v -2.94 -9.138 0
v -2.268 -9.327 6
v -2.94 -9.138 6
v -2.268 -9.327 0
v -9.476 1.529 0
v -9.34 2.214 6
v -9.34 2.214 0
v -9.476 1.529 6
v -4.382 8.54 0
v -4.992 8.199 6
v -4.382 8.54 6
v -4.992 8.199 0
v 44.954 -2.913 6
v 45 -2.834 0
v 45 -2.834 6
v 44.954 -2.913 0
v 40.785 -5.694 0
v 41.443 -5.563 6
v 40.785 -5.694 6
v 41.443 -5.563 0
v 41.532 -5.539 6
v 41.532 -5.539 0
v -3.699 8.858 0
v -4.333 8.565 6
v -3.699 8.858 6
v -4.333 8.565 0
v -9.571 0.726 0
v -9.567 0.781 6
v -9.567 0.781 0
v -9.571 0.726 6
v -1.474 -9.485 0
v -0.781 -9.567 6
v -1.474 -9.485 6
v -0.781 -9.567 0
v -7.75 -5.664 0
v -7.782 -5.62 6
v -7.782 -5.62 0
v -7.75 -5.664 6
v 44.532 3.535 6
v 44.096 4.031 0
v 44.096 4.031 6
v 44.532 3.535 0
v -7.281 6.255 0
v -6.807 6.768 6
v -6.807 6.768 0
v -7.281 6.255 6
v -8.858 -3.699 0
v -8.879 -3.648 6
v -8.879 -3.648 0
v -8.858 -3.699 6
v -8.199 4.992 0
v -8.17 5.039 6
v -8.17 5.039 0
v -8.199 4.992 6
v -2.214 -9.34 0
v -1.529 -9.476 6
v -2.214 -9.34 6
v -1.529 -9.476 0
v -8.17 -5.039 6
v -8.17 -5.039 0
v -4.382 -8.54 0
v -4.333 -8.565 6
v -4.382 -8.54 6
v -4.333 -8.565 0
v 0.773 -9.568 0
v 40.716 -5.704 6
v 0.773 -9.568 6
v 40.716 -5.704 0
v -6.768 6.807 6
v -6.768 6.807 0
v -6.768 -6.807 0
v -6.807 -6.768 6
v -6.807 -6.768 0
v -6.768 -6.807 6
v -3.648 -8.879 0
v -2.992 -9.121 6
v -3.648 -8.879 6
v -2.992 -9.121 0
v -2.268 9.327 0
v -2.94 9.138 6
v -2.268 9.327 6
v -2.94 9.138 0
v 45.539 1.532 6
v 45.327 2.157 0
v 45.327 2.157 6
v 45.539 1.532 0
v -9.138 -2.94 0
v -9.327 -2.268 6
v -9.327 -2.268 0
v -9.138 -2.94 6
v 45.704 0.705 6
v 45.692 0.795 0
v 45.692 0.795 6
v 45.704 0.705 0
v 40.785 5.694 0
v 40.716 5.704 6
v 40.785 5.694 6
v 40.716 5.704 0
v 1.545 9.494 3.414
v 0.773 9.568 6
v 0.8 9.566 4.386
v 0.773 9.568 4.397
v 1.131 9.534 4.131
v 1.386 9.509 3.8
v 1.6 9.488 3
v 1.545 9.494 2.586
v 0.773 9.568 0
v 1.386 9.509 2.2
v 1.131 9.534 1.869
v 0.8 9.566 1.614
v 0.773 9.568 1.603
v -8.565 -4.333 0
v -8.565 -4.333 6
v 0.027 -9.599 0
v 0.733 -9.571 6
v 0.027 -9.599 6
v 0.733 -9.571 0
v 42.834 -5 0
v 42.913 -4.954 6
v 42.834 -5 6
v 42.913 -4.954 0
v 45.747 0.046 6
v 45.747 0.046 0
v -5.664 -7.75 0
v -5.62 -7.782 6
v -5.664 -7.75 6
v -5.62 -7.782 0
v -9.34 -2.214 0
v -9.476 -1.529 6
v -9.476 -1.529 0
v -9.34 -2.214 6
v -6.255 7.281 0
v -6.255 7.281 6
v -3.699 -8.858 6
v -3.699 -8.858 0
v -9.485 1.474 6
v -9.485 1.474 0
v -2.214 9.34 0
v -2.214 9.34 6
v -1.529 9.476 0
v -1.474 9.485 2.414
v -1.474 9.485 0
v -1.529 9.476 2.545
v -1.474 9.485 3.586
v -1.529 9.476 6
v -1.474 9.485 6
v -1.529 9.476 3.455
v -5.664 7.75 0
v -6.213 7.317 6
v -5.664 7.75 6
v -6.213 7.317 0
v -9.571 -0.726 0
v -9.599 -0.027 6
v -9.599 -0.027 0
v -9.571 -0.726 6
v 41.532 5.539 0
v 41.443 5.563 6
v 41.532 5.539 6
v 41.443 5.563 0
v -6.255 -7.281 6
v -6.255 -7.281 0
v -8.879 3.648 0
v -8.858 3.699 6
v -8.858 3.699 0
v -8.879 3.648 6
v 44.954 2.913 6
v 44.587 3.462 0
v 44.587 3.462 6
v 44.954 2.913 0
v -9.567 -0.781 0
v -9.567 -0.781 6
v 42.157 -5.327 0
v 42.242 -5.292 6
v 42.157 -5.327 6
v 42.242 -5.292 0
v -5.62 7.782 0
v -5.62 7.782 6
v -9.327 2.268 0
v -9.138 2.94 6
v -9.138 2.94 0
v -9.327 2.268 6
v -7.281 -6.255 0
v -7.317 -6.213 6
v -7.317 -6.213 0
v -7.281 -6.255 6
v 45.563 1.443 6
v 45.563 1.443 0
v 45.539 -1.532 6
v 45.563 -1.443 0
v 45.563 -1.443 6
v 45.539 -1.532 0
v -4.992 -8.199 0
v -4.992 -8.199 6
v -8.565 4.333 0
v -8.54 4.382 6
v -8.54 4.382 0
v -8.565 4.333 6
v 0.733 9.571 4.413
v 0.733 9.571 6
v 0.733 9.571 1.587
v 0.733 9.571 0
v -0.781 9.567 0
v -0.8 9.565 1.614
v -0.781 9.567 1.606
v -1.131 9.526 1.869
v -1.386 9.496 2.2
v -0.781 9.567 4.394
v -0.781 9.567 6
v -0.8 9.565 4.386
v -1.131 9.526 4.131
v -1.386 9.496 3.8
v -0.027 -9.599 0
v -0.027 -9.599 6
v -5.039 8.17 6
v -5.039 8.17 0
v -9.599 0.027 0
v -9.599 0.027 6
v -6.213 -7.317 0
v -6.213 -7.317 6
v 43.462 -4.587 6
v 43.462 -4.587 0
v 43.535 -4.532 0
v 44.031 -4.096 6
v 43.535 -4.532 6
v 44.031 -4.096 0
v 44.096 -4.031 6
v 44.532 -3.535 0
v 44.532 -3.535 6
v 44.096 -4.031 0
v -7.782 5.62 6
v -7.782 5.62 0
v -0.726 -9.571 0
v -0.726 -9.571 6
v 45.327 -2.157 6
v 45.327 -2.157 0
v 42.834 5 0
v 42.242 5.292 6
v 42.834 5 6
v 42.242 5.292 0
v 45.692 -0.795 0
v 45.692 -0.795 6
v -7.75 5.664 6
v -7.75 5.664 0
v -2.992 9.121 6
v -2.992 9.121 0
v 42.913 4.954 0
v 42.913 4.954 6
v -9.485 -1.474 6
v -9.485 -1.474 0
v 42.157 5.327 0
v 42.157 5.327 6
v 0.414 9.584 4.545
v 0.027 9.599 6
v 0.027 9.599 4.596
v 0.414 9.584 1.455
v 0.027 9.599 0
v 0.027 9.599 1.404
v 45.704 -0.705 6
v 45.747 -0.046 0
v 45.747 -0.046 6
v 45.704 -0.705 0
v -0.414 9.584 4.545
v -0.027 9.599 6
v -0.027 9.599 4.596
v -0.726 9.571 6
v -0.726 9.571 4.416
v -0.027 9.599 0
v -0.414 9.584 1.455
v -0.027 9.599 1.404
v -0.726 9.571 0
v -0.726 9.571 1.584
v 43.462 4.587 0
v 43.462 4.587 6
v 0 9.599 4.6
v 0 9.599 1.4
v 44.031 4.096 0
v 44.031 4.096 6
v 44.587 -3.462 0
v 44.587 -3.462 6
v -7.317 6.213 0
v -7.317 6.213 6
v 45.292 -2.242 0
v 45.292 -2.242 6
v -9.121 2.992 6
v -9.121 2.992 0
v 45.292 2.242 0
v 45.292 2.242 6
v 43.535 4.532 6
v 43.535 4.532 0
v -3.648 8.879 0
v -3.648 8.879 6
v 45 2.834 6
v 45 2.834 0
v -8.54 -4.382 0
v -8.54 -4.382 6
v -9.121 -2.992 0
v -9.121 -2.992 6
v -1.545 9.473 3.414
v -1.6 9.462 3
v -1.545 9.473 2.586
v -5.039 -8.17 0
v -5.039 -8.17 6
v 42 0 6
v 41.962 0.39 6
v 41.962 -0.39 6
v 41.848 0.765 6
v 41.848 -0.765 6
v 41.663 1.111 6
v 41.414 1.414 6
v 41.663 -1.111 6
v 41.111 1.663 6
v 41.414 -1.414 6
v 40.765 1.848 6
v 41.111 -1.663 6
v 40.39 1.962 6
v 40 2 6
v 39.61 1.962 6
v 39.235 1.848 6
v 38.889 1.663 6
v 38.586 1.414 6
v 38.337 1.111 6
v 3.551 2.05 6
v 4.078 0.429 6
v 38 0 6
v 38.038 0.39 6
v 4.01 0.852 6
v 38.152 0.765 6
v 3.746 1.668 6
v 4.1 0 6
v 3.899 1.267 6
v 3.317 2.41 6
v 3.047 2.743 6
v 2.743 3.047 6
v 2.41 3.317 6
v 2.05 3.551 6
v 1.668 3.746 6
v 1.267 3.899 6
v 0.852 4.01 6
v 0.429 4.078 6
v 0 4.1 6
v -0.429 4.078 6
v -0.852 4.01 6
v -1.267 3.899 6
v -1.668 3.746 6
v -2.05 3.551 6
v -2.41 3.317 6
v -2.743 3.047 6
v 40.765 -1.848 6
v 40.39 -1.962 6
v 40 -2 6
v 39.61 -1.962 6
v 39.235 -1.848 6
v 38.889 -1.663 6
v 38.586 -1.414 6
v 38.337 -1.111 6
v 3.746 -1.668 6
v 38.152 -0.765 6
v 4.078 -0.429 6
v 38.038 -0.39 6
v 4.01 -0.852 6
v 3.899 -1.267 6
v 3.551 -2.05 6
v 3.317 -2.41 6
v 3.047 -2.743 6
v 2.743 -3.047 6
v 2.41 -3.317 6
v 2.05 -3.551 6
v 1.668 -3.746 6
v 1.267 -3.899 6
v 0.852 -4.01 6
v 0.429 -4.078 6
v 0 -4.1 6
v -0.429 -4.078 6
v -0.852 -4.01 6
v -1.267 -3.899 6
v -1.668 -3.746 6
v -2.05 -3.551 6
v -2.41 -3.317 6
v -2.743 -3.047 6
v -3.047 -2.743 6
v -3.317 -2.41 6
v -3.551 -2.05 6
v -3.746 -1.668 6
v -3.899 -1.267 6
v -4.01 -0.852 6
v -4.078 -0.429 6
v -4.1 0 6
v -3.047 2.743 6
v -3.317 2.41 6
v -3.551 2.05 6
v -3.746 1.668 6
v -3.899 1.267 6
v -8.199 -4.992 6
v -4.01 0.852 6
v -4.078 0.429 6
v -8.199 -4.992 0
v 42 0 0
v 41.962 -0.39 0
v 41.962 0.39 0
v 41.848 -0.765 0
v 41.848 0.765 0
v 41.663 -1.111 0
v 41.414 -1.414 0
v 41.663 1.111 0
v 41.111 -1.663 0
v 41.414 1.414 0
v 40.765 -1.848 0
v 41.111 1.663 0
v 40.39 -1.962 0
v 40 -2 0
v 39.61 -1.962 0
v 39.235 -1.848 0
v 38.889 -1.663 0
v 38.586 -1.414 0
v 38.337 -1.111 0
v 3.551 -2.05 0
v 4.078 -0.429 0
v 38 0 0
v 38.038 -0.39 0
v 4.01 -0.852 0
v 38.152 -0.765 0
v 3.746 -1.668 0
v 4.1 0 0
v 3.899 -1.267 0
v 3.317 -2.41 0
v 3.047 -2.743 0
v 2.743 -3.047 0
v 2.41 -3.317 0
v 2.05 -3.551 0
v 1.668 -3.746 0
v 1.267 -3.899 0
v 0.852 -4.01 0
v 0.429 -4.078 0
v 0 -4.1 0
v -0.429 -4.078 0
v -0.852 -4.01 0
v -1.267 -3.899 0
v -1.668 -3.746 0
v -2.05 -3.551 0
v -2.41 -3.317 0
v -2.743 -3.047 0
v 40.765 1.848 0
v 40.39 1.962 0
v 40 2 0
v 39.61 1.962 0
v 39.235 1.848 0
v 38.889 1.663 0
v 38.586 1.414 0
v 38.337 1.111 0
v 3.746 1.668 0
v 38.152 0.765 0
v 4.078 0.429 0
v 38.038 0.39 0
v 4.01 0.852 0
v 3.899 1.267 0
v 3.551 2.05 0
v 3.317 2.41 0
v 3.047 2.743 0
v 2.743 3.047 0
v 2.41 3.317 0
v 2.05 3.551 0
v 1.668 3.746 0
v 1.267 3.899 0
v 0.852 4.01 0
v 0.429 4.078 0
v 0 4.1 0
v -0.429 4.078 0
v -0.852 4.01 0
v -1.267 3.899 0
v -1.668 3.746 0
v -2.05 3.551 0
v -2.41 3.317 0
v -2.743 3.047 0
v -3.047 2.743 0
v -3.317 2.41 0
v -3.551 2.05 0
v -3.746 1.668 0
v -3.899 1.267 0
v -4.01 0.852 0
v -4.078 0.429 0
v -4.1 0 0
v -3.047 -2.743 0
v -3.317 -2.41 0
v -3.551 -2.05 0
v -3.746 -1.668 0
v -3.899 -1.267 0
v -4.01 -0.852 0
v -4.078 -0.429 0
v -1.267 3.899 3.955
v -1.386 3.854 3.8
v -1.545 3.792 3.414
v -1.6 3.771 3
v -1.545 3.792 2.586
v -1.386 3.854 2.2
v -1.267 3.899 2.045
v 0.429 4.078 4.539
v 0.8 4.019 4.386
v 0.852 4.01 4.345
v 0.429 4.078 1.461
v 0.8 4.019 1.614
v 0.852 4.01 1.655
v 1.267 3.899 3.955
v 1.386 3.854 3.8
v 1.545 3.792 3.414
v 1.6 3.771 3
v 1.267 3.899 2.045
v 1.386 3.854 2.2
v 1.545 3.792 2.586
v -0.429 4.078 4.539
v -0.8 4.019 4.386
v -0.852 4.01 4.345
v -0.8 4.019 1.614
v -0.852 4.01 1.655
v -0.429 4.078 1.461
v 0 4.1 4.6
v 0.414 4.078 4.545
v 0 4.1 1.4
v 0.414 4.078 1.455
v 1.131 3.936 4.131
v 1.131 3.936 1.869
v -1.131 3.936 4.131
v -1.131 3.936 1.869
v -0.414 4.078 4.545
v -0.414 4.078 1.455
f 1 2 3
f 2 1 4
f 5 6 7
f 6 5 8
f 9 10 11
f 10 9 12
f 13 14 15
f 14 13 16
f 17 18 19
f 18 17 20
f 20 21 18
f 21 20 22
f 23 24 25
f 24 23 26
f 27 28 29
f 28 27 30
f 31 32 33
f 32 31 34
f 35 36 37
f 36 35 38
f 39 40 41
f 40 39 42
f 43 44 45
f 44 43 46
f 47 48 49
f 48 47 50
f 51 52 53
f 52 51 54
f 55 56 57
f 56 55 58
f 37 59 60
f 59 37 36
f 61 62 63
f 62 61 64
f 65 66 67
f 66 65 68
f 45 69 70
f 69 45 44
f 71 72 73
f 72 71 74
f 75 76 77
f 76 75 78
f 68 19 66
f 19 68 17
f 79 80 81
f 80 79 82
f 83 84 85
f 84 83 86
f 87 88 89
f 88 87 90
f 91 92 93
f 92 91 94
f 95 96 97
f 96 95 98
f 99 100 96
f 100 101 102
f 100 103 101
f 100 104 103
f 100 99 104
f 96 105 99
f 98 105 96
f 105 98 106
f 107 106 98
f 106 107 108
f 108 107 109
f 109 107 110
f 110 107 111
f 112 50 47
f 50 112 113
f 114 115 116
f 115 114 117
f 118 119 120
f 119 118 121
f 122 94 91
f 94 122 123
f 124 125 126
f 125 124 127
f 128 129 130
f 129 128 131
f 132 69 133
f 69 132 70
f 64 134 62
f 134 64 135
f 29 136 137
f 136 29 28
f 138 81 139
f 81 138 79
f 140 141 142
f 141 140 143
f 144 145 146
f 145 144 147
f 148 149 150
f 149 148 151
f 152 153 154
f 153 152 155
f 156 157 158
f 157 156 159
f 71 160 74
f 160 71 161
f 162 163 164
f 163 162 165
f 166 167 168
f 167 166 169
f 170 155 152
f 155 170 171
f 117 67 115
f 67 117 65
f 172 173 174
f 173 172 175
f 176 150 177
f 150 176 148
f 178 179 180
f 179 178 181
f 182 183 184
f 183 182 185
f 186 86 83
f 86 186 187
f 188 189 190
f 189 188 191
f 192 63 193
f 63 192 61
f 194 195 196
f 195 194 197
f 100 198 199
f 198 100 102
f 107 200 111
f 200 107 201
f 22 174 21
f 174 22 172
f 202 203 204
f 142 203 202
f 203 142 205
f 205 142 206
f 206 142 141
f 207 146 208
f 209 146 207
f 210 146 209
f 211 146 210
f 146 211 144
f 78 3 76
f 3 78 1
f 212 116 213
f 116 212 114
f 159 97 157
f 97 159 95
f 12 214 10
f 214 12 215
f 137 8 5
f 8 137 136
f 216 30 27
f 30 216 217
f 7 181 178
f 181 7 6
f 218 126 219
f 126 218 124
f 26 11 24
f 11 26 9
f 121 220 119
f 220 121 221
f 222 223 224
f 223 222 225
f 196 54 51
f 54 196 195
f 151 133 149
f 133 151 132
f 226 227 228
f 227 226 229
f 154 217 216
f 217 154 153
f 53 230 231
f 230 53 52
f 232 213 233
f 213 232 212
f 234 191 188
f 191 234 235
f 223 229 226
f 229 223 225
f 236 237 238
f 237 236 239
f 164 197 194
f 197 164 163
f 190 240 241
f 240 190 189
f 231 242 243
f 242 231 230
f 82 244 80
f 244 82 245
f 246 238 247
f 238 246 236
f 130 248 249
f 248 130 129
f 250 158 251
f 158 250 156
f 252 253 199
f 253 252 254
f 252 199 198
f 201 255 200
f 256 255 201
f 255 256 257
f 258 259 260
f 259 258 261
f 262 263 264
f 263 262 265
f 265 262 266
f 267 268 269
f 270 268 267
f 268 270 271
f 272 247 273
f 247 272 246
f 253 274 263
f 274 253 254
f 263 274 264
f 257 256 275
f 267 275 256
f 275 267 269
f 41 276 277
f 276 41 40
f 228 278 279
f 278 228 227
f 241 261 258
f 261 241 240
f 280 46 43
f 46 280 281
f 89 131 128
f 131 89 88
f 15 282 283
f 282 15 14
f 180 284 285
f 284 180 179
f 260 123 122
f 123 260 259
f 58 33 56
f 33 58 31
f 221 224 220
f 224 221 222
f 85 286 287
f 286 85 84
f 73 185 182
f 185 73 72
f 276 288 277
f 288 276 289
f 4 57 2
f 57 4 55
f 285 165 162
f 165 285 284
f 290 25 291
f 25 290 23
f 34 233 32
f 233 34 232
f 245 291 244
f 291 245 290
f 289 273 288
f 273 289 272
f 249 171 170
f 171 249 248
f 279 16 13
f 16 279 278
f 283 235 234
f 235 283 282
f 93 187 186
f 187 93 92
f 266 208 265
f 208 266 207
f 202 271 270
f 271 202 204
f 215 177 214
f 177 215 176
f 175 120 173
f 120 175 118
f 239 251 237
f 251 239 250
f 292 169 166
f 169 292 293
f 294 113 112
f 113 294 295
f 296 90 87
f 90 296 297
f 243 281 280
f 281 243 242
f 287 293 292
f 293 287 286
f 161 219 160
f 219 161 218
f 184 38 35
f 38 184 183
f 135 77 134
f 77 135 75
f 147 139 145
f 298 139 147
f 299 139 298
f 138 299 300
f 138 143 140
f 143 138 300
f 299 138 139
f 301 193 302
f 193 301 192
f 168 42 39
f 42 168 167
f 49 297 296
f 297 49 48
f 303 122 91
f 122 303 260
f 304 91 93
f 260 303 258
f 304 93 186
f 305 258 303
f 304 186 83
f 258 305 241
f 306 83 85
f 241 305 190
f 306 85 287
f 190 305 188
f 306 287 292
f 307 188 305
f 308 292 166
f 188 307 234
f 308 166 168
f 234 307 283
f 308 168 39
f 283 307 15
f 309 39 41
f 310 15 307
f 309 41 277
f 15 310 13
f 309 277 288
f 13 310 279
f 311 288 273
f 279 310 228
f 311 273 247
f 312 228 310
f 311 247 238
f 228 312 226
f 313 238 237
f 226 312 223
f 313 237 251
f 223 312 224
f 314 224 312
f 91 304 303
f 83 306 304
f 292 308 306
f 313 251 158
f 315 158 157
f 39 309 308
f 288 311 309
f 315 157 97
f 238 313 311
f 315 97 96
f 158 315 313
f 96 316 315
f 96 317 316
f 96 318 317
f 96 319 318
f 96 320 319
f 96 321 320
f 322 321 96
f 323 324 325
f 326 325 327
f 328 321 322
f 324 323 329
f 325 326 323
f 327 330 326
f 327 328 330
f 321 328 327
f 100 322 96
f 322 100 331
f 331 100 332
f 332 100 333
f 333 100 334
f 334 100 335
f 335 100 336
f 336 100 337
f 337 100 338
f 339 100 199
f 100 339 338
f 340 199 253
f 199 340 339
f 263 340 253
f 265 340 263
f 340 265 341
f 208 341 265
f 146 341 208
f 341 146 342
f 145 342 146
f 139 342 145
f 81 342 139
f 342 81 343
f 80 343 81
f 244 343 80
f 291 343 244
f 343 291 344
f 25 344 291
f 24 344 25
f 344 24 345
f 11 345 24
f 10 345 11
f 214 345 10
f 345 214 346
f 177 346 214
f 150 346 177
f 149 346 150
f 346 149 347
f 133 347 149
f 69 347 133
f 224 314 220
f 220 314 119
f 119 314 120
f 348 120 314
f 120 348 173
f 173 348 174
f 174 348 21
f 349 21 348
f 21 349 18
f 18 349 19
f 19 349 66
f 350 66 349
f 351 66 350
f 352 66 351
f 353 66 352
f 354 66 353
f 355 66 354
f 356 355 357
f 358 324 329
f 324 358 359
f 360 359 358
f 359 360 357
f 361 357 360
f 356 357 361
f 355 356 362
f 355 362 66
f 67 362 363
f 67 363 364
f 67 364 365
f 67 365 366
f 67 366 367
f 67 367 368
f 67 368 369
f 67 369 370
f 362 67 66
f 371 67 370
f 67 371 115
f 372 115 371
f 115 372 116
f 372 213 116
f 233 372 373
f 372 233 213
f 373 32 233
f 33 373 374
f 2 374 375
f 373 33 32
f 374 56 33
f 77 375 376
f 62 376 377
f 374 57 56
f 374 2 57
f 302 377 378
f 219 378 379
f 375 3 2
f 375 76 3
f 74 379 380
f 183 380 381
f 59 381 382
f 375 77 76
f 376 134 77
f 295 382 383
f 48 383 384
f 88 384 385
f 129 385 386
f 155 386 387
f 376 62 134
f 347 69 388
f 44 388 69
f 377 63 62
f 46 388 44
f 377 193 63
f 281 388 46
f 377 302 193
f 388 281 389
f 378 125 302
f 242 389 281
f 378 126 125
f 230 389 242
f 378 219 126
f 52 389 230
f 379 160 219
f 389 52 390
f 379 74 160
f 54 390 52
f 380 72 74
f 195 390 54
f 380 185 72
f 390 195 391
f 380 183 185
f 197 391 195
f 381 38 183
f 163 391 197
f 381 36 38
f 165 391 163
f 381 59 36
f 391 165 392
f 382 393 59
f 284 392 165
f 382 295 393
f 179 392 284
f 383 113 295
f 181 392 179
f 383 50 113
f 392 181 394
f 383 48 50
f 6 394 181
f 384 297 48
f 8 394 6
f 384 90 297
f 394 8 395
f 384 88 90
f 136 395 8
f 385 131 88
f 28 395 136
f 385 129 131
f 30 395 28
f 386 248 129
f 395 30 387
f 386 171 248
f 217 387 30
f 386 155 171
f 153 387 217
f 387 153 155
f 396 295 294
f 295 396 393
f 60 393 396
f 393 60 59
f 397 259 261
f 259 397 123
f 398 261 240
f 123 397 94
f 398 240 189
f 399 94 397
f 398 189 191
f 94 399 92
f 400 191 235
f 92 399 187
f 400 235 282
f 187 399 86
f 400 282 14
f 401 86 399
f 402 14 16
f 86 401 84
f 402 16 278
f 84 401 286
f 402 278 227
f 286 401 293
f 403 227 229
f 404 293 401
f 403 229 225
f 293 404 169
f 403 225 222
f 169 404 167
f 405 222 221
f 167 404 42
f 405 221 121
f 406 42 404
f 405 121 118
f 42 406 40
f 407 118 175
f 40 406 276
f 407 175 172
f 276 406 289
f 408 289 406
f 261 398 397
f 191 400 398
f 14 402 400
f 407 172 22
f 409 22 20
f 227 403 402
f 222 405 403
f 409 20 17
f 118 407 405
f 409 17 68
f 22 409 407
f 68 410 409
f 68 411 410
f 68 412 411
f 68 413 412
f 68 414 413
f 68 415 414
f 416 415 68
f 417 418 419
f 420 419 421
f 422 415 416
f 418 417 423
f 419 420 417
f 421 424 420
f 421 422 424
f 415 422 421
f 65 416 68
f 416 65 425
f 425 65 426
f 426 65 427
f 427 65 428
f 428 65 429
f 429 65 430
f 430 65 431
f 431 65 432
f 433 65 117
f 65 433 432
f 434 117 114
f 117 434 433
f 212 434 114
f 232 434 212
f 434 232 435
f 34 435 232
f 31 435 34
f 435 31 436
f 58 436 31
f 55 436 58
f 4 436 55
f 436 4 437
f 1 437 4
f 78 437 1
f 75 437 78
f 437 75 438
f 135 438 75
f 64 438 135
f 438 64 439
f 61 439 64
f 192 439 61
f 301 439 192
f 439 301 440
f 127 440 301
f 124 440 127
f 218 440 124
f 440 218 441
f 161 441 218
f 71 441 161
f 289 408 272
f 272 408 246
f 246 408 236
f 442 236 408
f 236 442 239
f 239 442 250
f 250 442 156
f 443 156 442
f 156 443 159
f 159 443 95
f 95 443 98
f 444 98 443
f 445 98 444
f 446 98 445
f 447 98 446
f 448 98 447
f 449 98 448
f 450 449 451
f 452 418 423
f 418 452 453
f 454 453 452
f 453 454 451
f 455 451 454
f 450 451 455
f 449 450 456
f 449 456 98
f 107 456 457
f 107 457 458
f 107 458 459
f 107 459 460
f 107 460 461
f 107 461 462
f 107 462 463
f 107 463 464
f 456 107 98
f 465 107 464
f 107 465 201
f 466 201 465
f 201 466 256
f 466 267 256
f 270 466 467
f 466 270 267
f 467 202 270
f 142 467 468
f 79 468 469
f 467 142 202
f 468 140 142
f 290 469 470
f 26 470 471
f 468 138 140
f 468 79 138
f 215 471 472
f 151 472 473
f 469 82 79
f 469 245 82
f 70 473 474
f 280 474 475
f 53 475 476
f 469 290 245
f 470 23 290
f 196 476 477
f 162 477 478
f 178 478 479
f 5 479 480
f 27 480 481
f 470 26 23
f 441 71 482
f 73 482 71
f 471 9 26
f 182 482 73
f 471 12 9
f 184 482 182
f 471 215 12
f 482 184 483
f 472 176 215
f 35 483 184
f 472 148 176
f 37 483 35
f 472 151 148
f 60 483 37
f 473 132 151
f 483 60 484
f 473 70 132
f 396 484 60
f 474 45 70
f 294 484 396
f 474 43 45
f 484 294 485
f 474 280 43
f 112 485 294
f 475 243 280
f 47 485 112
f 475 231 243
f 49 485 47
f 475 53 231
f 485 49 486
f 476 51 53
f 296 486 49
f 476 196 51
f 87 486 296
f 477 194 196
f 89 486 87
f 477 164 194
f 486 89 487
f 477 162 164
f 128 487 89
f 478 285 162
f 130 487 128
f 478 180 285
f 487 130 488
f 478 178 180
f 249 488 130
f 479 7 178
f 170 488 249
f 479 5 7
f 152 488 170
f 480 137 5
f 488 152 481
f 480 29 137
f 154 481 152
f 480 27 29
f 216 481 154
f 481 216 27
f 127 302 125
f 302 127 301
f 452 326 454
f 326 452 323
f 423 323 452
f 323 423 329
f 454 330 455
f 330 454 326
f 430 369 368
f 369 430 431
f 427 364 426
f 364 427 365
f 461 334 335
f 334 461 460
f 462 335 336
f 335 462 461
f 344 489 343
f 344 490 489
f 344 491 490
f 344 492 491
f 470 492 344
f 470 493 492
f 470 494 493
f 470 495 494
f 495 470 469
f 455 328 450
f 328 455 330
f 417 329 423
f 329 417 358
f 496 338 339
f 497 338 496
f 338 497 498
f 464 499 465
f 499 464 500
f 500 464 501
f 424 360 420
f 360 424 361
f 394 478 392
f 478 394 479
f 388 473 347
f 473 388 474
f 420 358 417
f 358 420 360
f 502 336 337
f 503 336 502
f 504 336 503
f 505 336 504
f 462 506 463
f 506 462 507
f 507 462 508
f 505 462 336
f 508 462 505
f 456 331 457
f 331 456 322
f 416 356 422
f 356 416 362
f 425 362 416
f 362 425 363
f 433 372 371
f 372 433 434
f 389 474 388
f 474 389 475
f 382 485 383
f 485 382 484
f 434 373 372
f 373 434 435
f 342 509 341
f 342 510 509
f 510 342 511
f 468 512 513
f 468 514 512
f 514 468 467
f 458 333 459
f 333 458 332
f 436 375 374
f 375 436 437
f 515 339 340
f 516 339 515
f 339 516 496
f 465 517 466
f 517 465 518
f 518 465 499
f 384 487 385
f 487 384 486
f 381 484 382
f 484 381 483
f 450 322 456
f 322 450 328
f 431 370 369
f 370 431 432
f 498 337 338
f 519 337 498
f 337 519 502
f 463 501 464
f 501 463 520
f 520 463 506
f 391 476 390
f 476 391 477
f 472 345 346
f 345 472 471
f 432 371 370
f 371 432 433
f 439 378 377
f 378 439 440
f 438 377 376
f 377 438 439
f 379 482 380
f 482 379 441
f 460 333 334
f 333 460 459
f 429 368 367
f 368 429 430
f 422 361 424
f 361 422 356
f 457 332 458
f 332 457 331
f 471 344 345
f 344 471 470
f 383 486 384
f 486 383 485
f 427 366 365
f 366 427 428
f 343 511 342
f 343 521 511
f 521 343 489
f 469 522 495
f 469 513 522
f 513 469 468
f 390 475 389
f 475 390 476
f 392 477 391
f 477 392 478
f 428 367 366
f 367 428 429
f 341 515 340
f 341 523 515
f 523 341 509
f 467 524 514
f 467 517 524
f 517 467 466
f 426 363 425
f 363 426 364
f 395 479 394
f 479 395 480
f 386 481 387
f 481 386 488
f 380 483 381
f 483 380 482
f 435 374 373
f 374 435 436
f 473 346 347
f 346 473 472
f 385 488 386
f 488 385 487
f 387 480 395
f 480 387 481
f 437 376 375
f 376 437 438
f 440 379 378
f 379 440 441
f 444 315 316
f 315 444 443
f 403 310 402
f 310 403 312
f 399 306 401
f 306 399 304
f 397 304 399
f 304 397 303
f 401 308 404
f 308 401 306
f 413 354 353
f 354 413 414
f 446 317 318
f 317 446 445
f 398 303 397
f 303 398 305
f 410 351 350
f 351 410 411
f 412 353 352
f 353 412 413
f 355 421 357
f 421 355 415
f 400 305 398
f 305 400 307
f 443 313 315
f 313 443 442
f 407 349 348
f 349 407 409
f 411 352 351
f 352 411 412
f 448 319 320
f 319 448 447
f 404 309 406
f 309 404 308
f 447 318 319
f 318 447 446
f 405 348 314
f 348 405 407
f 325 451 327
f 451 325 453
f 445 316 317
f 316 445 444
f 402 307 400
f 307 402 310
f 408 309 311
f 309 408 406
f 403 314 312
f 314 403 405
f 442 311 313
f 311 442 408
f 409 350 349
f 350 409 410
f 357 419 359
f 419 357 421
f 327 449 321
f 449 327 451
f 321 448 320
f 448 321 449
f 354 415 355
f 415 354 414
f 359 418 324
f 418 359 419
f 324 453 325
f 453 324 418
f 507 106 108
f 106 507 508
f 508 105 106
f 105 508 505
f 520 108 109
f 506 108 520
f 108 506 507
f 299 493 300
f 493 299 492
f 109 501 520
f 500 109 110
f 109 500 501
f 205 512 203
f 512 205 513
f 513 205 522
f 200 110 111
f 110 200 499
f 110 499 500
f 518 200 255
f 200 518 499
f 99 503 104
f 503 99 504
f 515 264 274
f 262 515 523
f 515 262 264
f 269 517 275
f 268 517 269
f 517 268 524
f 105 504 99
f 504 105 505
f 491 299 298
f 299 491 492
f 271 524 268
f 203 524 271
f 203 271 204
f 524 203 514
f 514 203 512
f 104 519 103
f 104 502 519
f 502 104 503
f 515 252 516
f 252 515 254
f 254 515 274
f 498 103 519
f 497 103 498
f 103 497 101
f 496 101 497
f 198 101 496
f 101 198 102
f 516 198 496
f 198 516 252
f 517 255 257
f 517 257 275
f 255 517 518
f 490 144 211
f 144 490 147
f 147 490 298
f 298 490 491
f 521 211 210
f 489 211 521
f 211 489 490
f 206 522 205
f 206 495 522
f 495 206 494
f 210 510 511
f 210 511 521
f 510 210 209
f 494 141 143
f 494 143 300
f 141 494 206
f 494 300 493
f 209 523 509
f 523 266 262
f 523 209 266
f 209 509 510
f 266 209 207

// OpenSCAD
// file: ../lib/parts.scad
// =============================================================================
//  parts.scad  -  Printed mechanical parts: output shaft, arm.
//                 (출력용 기계 부품: 출력 샤프트, 암)
//  Depends on shaft / arm parameters and through() from util.scad.
//  (util.scad의 샤프트 / 암 파라미터 및 through()에 의존합니다)
// =============================================================================

// World-Z of the bearing outer faces (where the shaft shoulder seats).
// (베어링 외부 면의 월드 Z 좌표 - 샤프트 숄더가 안착되는 위치)
function lower_outer_z() = bearing_lip_floor - plate_th;   // motor-side bearing outer face (모터 쪽 베어링 외부 면)
function upper_outer_z() = plate_gap + bearing_w;          // arm-side bearing outer face (암 쪽 베어링 외부 면)

module output_shaft() {
    z0     = lower_outer_z();                             // shaft bottom flush with motor-side bearing outer face (모터 쪽 베어링 외부 면과 수평이 되는 샤프트 바닥)
    sh_lo  = upper_outer_z() - z0;                        // shoulder seats on the upper bearing outer face (상단 베어링 외부 면에 안착되는 숄더)
    L      = (upper_outer_z() + shaft_shoulder_h + shaft_overhang) - z0;
    flat0  = (lower_outer_z() + bearing_w) - z0;          // pulley/D-cut zone: between the two gap faces (풀리/D-컷 영역: 두 갭 면 사이)
    flat1  = (upper_outer_z() - bearing_w) - z0;
    // Self-supporting shoulder: flat seat (toward the bearing) + a 45-deg conical
    // (서포트가 필요 없는 숄더: 평평한 안착면 (베어링 쪽) + 45도 원뿔형)
    // lead-out on top. Print the shaft OUTPUT-END-DOWN so the seat face points up
    // (상단 리드아웃. 출력단이 아래를 향하도록 샤프트를 출력하여 안착면이 위를 향하게 하고)
    // (a flat shelf) and the cone is the only downward face -> 45 deg, no support.
    // (평평한 선반 형태, 원뿔이 유일하게 아래를 향하는 면이 되도록 함 -> 45도 경사로 서포트 불필요)
    taper  = (shaft_shoulder_d - output_bore) / 2;        // 45-deg radial step (45도 반경 방향 단차)
    difference() {
        union() {
            cylinder(d = output_bore, h = L, $fn = 72);
            // integral shoulder: seats on the upper bearing inner race -> blocks axial slide
            // (일체형 숄더: 상단 베어링 내륜에 안착됨 -> 축방향 미끄러짐 방지)
            translate([0, 0, sh_lo]) {
                cylinder(d = shaft_shoulder_d, h = shaft_shoulder_h - taper, $fn = 64);
                translate([0, 0, shaft_shoulder_h - taper])
                    cylinder(d1 = shaft_shoulder_d, d2 = output_bore,
                             h = taper, $fn = 64);
            }
        }
        // D-cut flat for the output-pulley set screw (gap/pulley engagement zone)
        // (출력 풀리 무두볼트를 위한 D-컷 평면 (갭/풀리 맞물림 영역))
        translate([output_bore / 2 - shaft_flat_depth, -output_bore, flat0])
            cube([output_bore, 2 * output_bore, flat1 - flat0]);
    }
}

module output_arm() {
    difference() {
        union() {
            linear_extrude(arm_th)
                soft_outline2d(0.7)
                    hull() {
                        circle(d = arm_hub_d + 1.2, $fn = 80);
                        translate([arm_len, 0]) circle(d = 11.5, $fn = 48);
                    }
        }
        through(output_bore + bore_clearance, arm_th);
        translate([arm_len, 0, 0]) through(arm_end_hole_d, arm_th, 32);
        if (set_screw_d > 0)
            translate([0, 0, arm_th / 2]) rotate([-90, 0, 0])
                cylinder(d = set_screw_d, h = arm_hub_d, $fn = 24);
    }
}
// file: ../lib/util.scad
// =============================================================================
//  util.scad  -  Small generic primitives reused across parts (DRY helpers).
//                (여러 부품에서 재사용되는 작은 공통 기본 도형 (DRY 도우미))
//  Not standalone; included after params.scad by each part entry point.
//  (단독 실행 불가; 각 부품 진입점의 params.scad 이후에 인클루드됨)
// =============================================================================

// Through-cut cylinder for clean difference(): bored from boolean_eps below z=0
// up past z=h. Wrap in translate([x, y, 0]) to position in the XY plane.
// Overlap is just boolean_eps so booleans stay tight (no oversized cuts).
// (깔끔한 difference() 처리를 위한 관통형 실린더: z=0 아래 boolean_eps부터 z=h 위까지 파냅니다.
// XY 평면에 배치하려면 translate([x, y, 0])로 감싸세요.
// 겹치는 부분은 boolean_eps만큼이므로 부울 연산이 정밀하게 유지됩니다 (과도한 컷팅 없음).)
module through(d, h, fn = 60) {
    translate([0, 0, -boolean_eps]) cylinder(d = d, h = h + 2 * boolean_eps, $fn = fn);
}

// Hollow cylinder (outer/inner diameter, base at z=0).
// (중공 실린더 (외경/내경, 밑면은 z=0))
module ring3d(od, id, h) {
    difference() {
        cylinder(d = od, h = h, $fn = 80);
        through(id, h);
    }
}

module soft_outline2d(r = skin_rounding) {
    offset(r = r, $fn = 24) offset(delta = -r) children();
}

module rounded_rect2d(size, r) {
    x = size[0];
    y = size[1];
    rr = min(r, min(x, y) / 2);
    hull() {
        translate([-x / 2 + rr, -y / 2 + rr]) circle(r = rr, $fn = 48);
        translate([ x / 2 - rr, -y / 2 + rr]) circle(r = rr, $fn = 48);
        translate([-x / 2 + rr,  y / 2 - rr]) circle(r = rr, $fn = 48);
        translate([ x / 2 - rr,  y / 2 - rr]) circle(r = rr, $fn = 48);
    }
}

// 2D stadium slot along X (used for the motor tensioning slots).
// (X축 방향 2D 스타디움 슬롯 (모터 장력 조절 슬롯에 사용됨))
module xslot(d, len) {
    hull() {
        translate([-len / 2, 0]) circle(d = d, $fn = 32);
        translate([ len / 2, 0]) circle(d = d, $fn = 32);
    }
}
// file: ../lib/params.scad
// =============================================================================
//  params.scad  -  Single source of truth for the NEMA17 GT2 joint actuator.
//                  (NEMA17 GT2 조인트 액추에이터의 모든 파라미터를 관리하는 단일 소스)
//  Included by every printable part and by the assembly preview.
//  (모든 출력 가능한 부품과 어셈블리 미리보기에서 인클루드됩니다)
// =============================================================================

/* [ Assembly preview (어셈블리 미리보기) ] */
show_labels = true; // assembly annotation labels (어셈블리 주석 라벨 표시)

/* [ Clearances / fit (공차 / 맞춤 - 0.28mm Standard @ SparkX i7, 0.4 노즐 기준) ] */
boolean_eps       = 0.02;
bore_clearance    = 0.20;
tooth_clearance   = 0.06;
bearing_press_fit = 0.10;  // positive value shrinks the 608ZZ pocket for press-fit (diametral) (양수 값은 억지 끼워맞춤을 위해 608ZZ 포켓을 축소시킴, 직경 기준)
print_chamfer     = 0.6;   // 45° lead-in on bores/shaft: easier press-fit/slip-fit + elephant-foot relief (보어/샤프트 45° 리드인: 압입/슬립핏 용이 + 엘리펀트풋 완화)

/* [ GT2 belt (GT2 벨트) ] */
belt_pitch       = 2.0;
belt_pld         = 0.254;
belt_width       = 6.0;
belt_thickness   = 1.4;

/* [ Pulleys (풀리) ] */
input_teeth      = 20;
output_teeth     = 60;
input_bore       = 5.0;
output_bore      = 8.0;
flange_t         = 1.2;
flange_extra     = 1.9;
input_hub_h      = 5.0;
output_hub_h     = 6.0;
set_screw_d      = 3.2;

/* [ Geometry / center distance (형상 / 중심 거리) ] */
center_distance  = 32.5;   // 150mm GT2 closed-loop belt nominal centre distance (20T -> 60T) (150mm GT2 폐루프 벨트의 공칭 중심 거리, 20T -> 60T)
tension_travel   = 6.0;
plate_gap        = 25.0;

/* [ NEMA17 motor (SF2424 = SANYO DENKI SF2424-12B41) ] */
motor_size       = 42.3;
motor_hole_pitch = 31.0;
motor_screw_d    = 3.4;
motor_boss_d     = 22.4;  // SF2424 front pilot boss is phi22; keep 0.4mm diametral print clearance.
motor_body_len   = 59.5;

/* [ Bearings / journal (베어링 / 저널) ] */
bearing_od       = 22.0;
bearing_w        = 7.0;

/* [ Frame plates / integrated corner towers (프레임 플레이트 / 일체형 코너 타워) ] */
plate_th         = bearing_w;
standoff_screw_d = 3.4;
post_pilot_d     = 2.6;
post_pilot_depth = 14.0;
post_tower_size  = 20.0;
post_wall        = bearing_w;  // post leg thickness = plate thickness; one structural thickness everywhere (포스트 레그 두께 = 플레이트 두께; 구조 두께를 어디서나 동일하게)
post_inner_relief_r = post_tower_size - post_wall;  // inner-corner round derived from post_wall; larger round also clears the mount slot + M3 head (post_wall에서 파생된 안쪽 모서리 둥글기; 더 큰 둥글기는 마운트 슬롯 및 M3 헤드 간섭도 방지)
post_pulley_clearance = 2.0;
strut_w          = 8.0;
hub_collar       = 6.0;
boss_extra       = 3.0;
motor_pad_margin = 3.0;
plate_edge_margin = 8.0;
plate_corner_r    = 12.0;

/* [ Visual refinement (시각적 개선) ] */
skin_rounding     = 0.85;

/* [ Bearing pocket (베어링 포켓) ] */
// 608ZZ outer race is held only by the press-fit bore.
// (608ZZ 외륜은 억지 끼워맞춤 보어만으로 고정됩니다.)

/* [ Printed shaft (phase 1) (출력용 샤프트 (1단계)) ] */
shaft_overhang   = 30.0;
shaft_flat_depth = 1.0;

/* [ Output shaft retention (출력 샤프트 고정) ] */
// Integral shoulder seats on the upper bearing GAP-side (inner) race face ->
// positive PULL-OUT stop (shaft can't slide out toward the arm). Push-in toward
// the motor is held by the output-pulley set screw on the D-cut. The output
// pulley installs HUB-DOWN so its hub clears this inboard shoulder.
// (일체형 숄더가 상단 베어링 갭쪽(안쪽) 내륜 면에 안착됨 -> pull-out(빠짐) 기계적 정지(샤프트가 암 쪽으로 빠지지 않음). 모터 쪽으로 밀려 들어가는 것은 D-컷의 출력 풀리 무두볼트가 고정. 출력 풀리는 허브가 아래로 가게 조립하여 이 안쪽 숄더를 피함.)
shaft_shoulder_d = 12.0;
shaft_shoulder_h = 3.0;

/* [ Output arm (optional joint link) (출력 암 (선택적 조인트 링크)) ] */
arm_len          = 40.0;
arm_th           = 6.0;
arm_hub_d        = 18.0;
arm_end_hole_d   = 4.0;

/* [ Quality (품질) ] */
$fa = 2;
$fs = 0.4;

// Standoff / corner tower screw positions in the plate plane.
// (플레이트 평면 상의 스탠드오프 / 코너 타워 나사 위치)
// Both ends share the same |Y| so the four pilots form a symmetric rectangle.
// (양 끝이 동일한 |Y| 값을 공유하므로 4개의 파일럿 홀이 대칭형 직사각형을 형성함)
post_y = motor_size/2;   // ±21.15 — push posts out to the plate corners (±21.15 — 포스트를 플레이트 모서리 쪽으로 밀어냄)
standoffs = [
    [-motor_size/2 - 3, -post_y],
    [-motor_size/2 - 3,  post_y],
    [ center_distance + 25, -post_y],
    [ center_distance + 25,  post_y]
];
// main file
include <../lib/params.scad>
include <../lib/util.scad>
include <../lib/parts.scad>

output_arm();
